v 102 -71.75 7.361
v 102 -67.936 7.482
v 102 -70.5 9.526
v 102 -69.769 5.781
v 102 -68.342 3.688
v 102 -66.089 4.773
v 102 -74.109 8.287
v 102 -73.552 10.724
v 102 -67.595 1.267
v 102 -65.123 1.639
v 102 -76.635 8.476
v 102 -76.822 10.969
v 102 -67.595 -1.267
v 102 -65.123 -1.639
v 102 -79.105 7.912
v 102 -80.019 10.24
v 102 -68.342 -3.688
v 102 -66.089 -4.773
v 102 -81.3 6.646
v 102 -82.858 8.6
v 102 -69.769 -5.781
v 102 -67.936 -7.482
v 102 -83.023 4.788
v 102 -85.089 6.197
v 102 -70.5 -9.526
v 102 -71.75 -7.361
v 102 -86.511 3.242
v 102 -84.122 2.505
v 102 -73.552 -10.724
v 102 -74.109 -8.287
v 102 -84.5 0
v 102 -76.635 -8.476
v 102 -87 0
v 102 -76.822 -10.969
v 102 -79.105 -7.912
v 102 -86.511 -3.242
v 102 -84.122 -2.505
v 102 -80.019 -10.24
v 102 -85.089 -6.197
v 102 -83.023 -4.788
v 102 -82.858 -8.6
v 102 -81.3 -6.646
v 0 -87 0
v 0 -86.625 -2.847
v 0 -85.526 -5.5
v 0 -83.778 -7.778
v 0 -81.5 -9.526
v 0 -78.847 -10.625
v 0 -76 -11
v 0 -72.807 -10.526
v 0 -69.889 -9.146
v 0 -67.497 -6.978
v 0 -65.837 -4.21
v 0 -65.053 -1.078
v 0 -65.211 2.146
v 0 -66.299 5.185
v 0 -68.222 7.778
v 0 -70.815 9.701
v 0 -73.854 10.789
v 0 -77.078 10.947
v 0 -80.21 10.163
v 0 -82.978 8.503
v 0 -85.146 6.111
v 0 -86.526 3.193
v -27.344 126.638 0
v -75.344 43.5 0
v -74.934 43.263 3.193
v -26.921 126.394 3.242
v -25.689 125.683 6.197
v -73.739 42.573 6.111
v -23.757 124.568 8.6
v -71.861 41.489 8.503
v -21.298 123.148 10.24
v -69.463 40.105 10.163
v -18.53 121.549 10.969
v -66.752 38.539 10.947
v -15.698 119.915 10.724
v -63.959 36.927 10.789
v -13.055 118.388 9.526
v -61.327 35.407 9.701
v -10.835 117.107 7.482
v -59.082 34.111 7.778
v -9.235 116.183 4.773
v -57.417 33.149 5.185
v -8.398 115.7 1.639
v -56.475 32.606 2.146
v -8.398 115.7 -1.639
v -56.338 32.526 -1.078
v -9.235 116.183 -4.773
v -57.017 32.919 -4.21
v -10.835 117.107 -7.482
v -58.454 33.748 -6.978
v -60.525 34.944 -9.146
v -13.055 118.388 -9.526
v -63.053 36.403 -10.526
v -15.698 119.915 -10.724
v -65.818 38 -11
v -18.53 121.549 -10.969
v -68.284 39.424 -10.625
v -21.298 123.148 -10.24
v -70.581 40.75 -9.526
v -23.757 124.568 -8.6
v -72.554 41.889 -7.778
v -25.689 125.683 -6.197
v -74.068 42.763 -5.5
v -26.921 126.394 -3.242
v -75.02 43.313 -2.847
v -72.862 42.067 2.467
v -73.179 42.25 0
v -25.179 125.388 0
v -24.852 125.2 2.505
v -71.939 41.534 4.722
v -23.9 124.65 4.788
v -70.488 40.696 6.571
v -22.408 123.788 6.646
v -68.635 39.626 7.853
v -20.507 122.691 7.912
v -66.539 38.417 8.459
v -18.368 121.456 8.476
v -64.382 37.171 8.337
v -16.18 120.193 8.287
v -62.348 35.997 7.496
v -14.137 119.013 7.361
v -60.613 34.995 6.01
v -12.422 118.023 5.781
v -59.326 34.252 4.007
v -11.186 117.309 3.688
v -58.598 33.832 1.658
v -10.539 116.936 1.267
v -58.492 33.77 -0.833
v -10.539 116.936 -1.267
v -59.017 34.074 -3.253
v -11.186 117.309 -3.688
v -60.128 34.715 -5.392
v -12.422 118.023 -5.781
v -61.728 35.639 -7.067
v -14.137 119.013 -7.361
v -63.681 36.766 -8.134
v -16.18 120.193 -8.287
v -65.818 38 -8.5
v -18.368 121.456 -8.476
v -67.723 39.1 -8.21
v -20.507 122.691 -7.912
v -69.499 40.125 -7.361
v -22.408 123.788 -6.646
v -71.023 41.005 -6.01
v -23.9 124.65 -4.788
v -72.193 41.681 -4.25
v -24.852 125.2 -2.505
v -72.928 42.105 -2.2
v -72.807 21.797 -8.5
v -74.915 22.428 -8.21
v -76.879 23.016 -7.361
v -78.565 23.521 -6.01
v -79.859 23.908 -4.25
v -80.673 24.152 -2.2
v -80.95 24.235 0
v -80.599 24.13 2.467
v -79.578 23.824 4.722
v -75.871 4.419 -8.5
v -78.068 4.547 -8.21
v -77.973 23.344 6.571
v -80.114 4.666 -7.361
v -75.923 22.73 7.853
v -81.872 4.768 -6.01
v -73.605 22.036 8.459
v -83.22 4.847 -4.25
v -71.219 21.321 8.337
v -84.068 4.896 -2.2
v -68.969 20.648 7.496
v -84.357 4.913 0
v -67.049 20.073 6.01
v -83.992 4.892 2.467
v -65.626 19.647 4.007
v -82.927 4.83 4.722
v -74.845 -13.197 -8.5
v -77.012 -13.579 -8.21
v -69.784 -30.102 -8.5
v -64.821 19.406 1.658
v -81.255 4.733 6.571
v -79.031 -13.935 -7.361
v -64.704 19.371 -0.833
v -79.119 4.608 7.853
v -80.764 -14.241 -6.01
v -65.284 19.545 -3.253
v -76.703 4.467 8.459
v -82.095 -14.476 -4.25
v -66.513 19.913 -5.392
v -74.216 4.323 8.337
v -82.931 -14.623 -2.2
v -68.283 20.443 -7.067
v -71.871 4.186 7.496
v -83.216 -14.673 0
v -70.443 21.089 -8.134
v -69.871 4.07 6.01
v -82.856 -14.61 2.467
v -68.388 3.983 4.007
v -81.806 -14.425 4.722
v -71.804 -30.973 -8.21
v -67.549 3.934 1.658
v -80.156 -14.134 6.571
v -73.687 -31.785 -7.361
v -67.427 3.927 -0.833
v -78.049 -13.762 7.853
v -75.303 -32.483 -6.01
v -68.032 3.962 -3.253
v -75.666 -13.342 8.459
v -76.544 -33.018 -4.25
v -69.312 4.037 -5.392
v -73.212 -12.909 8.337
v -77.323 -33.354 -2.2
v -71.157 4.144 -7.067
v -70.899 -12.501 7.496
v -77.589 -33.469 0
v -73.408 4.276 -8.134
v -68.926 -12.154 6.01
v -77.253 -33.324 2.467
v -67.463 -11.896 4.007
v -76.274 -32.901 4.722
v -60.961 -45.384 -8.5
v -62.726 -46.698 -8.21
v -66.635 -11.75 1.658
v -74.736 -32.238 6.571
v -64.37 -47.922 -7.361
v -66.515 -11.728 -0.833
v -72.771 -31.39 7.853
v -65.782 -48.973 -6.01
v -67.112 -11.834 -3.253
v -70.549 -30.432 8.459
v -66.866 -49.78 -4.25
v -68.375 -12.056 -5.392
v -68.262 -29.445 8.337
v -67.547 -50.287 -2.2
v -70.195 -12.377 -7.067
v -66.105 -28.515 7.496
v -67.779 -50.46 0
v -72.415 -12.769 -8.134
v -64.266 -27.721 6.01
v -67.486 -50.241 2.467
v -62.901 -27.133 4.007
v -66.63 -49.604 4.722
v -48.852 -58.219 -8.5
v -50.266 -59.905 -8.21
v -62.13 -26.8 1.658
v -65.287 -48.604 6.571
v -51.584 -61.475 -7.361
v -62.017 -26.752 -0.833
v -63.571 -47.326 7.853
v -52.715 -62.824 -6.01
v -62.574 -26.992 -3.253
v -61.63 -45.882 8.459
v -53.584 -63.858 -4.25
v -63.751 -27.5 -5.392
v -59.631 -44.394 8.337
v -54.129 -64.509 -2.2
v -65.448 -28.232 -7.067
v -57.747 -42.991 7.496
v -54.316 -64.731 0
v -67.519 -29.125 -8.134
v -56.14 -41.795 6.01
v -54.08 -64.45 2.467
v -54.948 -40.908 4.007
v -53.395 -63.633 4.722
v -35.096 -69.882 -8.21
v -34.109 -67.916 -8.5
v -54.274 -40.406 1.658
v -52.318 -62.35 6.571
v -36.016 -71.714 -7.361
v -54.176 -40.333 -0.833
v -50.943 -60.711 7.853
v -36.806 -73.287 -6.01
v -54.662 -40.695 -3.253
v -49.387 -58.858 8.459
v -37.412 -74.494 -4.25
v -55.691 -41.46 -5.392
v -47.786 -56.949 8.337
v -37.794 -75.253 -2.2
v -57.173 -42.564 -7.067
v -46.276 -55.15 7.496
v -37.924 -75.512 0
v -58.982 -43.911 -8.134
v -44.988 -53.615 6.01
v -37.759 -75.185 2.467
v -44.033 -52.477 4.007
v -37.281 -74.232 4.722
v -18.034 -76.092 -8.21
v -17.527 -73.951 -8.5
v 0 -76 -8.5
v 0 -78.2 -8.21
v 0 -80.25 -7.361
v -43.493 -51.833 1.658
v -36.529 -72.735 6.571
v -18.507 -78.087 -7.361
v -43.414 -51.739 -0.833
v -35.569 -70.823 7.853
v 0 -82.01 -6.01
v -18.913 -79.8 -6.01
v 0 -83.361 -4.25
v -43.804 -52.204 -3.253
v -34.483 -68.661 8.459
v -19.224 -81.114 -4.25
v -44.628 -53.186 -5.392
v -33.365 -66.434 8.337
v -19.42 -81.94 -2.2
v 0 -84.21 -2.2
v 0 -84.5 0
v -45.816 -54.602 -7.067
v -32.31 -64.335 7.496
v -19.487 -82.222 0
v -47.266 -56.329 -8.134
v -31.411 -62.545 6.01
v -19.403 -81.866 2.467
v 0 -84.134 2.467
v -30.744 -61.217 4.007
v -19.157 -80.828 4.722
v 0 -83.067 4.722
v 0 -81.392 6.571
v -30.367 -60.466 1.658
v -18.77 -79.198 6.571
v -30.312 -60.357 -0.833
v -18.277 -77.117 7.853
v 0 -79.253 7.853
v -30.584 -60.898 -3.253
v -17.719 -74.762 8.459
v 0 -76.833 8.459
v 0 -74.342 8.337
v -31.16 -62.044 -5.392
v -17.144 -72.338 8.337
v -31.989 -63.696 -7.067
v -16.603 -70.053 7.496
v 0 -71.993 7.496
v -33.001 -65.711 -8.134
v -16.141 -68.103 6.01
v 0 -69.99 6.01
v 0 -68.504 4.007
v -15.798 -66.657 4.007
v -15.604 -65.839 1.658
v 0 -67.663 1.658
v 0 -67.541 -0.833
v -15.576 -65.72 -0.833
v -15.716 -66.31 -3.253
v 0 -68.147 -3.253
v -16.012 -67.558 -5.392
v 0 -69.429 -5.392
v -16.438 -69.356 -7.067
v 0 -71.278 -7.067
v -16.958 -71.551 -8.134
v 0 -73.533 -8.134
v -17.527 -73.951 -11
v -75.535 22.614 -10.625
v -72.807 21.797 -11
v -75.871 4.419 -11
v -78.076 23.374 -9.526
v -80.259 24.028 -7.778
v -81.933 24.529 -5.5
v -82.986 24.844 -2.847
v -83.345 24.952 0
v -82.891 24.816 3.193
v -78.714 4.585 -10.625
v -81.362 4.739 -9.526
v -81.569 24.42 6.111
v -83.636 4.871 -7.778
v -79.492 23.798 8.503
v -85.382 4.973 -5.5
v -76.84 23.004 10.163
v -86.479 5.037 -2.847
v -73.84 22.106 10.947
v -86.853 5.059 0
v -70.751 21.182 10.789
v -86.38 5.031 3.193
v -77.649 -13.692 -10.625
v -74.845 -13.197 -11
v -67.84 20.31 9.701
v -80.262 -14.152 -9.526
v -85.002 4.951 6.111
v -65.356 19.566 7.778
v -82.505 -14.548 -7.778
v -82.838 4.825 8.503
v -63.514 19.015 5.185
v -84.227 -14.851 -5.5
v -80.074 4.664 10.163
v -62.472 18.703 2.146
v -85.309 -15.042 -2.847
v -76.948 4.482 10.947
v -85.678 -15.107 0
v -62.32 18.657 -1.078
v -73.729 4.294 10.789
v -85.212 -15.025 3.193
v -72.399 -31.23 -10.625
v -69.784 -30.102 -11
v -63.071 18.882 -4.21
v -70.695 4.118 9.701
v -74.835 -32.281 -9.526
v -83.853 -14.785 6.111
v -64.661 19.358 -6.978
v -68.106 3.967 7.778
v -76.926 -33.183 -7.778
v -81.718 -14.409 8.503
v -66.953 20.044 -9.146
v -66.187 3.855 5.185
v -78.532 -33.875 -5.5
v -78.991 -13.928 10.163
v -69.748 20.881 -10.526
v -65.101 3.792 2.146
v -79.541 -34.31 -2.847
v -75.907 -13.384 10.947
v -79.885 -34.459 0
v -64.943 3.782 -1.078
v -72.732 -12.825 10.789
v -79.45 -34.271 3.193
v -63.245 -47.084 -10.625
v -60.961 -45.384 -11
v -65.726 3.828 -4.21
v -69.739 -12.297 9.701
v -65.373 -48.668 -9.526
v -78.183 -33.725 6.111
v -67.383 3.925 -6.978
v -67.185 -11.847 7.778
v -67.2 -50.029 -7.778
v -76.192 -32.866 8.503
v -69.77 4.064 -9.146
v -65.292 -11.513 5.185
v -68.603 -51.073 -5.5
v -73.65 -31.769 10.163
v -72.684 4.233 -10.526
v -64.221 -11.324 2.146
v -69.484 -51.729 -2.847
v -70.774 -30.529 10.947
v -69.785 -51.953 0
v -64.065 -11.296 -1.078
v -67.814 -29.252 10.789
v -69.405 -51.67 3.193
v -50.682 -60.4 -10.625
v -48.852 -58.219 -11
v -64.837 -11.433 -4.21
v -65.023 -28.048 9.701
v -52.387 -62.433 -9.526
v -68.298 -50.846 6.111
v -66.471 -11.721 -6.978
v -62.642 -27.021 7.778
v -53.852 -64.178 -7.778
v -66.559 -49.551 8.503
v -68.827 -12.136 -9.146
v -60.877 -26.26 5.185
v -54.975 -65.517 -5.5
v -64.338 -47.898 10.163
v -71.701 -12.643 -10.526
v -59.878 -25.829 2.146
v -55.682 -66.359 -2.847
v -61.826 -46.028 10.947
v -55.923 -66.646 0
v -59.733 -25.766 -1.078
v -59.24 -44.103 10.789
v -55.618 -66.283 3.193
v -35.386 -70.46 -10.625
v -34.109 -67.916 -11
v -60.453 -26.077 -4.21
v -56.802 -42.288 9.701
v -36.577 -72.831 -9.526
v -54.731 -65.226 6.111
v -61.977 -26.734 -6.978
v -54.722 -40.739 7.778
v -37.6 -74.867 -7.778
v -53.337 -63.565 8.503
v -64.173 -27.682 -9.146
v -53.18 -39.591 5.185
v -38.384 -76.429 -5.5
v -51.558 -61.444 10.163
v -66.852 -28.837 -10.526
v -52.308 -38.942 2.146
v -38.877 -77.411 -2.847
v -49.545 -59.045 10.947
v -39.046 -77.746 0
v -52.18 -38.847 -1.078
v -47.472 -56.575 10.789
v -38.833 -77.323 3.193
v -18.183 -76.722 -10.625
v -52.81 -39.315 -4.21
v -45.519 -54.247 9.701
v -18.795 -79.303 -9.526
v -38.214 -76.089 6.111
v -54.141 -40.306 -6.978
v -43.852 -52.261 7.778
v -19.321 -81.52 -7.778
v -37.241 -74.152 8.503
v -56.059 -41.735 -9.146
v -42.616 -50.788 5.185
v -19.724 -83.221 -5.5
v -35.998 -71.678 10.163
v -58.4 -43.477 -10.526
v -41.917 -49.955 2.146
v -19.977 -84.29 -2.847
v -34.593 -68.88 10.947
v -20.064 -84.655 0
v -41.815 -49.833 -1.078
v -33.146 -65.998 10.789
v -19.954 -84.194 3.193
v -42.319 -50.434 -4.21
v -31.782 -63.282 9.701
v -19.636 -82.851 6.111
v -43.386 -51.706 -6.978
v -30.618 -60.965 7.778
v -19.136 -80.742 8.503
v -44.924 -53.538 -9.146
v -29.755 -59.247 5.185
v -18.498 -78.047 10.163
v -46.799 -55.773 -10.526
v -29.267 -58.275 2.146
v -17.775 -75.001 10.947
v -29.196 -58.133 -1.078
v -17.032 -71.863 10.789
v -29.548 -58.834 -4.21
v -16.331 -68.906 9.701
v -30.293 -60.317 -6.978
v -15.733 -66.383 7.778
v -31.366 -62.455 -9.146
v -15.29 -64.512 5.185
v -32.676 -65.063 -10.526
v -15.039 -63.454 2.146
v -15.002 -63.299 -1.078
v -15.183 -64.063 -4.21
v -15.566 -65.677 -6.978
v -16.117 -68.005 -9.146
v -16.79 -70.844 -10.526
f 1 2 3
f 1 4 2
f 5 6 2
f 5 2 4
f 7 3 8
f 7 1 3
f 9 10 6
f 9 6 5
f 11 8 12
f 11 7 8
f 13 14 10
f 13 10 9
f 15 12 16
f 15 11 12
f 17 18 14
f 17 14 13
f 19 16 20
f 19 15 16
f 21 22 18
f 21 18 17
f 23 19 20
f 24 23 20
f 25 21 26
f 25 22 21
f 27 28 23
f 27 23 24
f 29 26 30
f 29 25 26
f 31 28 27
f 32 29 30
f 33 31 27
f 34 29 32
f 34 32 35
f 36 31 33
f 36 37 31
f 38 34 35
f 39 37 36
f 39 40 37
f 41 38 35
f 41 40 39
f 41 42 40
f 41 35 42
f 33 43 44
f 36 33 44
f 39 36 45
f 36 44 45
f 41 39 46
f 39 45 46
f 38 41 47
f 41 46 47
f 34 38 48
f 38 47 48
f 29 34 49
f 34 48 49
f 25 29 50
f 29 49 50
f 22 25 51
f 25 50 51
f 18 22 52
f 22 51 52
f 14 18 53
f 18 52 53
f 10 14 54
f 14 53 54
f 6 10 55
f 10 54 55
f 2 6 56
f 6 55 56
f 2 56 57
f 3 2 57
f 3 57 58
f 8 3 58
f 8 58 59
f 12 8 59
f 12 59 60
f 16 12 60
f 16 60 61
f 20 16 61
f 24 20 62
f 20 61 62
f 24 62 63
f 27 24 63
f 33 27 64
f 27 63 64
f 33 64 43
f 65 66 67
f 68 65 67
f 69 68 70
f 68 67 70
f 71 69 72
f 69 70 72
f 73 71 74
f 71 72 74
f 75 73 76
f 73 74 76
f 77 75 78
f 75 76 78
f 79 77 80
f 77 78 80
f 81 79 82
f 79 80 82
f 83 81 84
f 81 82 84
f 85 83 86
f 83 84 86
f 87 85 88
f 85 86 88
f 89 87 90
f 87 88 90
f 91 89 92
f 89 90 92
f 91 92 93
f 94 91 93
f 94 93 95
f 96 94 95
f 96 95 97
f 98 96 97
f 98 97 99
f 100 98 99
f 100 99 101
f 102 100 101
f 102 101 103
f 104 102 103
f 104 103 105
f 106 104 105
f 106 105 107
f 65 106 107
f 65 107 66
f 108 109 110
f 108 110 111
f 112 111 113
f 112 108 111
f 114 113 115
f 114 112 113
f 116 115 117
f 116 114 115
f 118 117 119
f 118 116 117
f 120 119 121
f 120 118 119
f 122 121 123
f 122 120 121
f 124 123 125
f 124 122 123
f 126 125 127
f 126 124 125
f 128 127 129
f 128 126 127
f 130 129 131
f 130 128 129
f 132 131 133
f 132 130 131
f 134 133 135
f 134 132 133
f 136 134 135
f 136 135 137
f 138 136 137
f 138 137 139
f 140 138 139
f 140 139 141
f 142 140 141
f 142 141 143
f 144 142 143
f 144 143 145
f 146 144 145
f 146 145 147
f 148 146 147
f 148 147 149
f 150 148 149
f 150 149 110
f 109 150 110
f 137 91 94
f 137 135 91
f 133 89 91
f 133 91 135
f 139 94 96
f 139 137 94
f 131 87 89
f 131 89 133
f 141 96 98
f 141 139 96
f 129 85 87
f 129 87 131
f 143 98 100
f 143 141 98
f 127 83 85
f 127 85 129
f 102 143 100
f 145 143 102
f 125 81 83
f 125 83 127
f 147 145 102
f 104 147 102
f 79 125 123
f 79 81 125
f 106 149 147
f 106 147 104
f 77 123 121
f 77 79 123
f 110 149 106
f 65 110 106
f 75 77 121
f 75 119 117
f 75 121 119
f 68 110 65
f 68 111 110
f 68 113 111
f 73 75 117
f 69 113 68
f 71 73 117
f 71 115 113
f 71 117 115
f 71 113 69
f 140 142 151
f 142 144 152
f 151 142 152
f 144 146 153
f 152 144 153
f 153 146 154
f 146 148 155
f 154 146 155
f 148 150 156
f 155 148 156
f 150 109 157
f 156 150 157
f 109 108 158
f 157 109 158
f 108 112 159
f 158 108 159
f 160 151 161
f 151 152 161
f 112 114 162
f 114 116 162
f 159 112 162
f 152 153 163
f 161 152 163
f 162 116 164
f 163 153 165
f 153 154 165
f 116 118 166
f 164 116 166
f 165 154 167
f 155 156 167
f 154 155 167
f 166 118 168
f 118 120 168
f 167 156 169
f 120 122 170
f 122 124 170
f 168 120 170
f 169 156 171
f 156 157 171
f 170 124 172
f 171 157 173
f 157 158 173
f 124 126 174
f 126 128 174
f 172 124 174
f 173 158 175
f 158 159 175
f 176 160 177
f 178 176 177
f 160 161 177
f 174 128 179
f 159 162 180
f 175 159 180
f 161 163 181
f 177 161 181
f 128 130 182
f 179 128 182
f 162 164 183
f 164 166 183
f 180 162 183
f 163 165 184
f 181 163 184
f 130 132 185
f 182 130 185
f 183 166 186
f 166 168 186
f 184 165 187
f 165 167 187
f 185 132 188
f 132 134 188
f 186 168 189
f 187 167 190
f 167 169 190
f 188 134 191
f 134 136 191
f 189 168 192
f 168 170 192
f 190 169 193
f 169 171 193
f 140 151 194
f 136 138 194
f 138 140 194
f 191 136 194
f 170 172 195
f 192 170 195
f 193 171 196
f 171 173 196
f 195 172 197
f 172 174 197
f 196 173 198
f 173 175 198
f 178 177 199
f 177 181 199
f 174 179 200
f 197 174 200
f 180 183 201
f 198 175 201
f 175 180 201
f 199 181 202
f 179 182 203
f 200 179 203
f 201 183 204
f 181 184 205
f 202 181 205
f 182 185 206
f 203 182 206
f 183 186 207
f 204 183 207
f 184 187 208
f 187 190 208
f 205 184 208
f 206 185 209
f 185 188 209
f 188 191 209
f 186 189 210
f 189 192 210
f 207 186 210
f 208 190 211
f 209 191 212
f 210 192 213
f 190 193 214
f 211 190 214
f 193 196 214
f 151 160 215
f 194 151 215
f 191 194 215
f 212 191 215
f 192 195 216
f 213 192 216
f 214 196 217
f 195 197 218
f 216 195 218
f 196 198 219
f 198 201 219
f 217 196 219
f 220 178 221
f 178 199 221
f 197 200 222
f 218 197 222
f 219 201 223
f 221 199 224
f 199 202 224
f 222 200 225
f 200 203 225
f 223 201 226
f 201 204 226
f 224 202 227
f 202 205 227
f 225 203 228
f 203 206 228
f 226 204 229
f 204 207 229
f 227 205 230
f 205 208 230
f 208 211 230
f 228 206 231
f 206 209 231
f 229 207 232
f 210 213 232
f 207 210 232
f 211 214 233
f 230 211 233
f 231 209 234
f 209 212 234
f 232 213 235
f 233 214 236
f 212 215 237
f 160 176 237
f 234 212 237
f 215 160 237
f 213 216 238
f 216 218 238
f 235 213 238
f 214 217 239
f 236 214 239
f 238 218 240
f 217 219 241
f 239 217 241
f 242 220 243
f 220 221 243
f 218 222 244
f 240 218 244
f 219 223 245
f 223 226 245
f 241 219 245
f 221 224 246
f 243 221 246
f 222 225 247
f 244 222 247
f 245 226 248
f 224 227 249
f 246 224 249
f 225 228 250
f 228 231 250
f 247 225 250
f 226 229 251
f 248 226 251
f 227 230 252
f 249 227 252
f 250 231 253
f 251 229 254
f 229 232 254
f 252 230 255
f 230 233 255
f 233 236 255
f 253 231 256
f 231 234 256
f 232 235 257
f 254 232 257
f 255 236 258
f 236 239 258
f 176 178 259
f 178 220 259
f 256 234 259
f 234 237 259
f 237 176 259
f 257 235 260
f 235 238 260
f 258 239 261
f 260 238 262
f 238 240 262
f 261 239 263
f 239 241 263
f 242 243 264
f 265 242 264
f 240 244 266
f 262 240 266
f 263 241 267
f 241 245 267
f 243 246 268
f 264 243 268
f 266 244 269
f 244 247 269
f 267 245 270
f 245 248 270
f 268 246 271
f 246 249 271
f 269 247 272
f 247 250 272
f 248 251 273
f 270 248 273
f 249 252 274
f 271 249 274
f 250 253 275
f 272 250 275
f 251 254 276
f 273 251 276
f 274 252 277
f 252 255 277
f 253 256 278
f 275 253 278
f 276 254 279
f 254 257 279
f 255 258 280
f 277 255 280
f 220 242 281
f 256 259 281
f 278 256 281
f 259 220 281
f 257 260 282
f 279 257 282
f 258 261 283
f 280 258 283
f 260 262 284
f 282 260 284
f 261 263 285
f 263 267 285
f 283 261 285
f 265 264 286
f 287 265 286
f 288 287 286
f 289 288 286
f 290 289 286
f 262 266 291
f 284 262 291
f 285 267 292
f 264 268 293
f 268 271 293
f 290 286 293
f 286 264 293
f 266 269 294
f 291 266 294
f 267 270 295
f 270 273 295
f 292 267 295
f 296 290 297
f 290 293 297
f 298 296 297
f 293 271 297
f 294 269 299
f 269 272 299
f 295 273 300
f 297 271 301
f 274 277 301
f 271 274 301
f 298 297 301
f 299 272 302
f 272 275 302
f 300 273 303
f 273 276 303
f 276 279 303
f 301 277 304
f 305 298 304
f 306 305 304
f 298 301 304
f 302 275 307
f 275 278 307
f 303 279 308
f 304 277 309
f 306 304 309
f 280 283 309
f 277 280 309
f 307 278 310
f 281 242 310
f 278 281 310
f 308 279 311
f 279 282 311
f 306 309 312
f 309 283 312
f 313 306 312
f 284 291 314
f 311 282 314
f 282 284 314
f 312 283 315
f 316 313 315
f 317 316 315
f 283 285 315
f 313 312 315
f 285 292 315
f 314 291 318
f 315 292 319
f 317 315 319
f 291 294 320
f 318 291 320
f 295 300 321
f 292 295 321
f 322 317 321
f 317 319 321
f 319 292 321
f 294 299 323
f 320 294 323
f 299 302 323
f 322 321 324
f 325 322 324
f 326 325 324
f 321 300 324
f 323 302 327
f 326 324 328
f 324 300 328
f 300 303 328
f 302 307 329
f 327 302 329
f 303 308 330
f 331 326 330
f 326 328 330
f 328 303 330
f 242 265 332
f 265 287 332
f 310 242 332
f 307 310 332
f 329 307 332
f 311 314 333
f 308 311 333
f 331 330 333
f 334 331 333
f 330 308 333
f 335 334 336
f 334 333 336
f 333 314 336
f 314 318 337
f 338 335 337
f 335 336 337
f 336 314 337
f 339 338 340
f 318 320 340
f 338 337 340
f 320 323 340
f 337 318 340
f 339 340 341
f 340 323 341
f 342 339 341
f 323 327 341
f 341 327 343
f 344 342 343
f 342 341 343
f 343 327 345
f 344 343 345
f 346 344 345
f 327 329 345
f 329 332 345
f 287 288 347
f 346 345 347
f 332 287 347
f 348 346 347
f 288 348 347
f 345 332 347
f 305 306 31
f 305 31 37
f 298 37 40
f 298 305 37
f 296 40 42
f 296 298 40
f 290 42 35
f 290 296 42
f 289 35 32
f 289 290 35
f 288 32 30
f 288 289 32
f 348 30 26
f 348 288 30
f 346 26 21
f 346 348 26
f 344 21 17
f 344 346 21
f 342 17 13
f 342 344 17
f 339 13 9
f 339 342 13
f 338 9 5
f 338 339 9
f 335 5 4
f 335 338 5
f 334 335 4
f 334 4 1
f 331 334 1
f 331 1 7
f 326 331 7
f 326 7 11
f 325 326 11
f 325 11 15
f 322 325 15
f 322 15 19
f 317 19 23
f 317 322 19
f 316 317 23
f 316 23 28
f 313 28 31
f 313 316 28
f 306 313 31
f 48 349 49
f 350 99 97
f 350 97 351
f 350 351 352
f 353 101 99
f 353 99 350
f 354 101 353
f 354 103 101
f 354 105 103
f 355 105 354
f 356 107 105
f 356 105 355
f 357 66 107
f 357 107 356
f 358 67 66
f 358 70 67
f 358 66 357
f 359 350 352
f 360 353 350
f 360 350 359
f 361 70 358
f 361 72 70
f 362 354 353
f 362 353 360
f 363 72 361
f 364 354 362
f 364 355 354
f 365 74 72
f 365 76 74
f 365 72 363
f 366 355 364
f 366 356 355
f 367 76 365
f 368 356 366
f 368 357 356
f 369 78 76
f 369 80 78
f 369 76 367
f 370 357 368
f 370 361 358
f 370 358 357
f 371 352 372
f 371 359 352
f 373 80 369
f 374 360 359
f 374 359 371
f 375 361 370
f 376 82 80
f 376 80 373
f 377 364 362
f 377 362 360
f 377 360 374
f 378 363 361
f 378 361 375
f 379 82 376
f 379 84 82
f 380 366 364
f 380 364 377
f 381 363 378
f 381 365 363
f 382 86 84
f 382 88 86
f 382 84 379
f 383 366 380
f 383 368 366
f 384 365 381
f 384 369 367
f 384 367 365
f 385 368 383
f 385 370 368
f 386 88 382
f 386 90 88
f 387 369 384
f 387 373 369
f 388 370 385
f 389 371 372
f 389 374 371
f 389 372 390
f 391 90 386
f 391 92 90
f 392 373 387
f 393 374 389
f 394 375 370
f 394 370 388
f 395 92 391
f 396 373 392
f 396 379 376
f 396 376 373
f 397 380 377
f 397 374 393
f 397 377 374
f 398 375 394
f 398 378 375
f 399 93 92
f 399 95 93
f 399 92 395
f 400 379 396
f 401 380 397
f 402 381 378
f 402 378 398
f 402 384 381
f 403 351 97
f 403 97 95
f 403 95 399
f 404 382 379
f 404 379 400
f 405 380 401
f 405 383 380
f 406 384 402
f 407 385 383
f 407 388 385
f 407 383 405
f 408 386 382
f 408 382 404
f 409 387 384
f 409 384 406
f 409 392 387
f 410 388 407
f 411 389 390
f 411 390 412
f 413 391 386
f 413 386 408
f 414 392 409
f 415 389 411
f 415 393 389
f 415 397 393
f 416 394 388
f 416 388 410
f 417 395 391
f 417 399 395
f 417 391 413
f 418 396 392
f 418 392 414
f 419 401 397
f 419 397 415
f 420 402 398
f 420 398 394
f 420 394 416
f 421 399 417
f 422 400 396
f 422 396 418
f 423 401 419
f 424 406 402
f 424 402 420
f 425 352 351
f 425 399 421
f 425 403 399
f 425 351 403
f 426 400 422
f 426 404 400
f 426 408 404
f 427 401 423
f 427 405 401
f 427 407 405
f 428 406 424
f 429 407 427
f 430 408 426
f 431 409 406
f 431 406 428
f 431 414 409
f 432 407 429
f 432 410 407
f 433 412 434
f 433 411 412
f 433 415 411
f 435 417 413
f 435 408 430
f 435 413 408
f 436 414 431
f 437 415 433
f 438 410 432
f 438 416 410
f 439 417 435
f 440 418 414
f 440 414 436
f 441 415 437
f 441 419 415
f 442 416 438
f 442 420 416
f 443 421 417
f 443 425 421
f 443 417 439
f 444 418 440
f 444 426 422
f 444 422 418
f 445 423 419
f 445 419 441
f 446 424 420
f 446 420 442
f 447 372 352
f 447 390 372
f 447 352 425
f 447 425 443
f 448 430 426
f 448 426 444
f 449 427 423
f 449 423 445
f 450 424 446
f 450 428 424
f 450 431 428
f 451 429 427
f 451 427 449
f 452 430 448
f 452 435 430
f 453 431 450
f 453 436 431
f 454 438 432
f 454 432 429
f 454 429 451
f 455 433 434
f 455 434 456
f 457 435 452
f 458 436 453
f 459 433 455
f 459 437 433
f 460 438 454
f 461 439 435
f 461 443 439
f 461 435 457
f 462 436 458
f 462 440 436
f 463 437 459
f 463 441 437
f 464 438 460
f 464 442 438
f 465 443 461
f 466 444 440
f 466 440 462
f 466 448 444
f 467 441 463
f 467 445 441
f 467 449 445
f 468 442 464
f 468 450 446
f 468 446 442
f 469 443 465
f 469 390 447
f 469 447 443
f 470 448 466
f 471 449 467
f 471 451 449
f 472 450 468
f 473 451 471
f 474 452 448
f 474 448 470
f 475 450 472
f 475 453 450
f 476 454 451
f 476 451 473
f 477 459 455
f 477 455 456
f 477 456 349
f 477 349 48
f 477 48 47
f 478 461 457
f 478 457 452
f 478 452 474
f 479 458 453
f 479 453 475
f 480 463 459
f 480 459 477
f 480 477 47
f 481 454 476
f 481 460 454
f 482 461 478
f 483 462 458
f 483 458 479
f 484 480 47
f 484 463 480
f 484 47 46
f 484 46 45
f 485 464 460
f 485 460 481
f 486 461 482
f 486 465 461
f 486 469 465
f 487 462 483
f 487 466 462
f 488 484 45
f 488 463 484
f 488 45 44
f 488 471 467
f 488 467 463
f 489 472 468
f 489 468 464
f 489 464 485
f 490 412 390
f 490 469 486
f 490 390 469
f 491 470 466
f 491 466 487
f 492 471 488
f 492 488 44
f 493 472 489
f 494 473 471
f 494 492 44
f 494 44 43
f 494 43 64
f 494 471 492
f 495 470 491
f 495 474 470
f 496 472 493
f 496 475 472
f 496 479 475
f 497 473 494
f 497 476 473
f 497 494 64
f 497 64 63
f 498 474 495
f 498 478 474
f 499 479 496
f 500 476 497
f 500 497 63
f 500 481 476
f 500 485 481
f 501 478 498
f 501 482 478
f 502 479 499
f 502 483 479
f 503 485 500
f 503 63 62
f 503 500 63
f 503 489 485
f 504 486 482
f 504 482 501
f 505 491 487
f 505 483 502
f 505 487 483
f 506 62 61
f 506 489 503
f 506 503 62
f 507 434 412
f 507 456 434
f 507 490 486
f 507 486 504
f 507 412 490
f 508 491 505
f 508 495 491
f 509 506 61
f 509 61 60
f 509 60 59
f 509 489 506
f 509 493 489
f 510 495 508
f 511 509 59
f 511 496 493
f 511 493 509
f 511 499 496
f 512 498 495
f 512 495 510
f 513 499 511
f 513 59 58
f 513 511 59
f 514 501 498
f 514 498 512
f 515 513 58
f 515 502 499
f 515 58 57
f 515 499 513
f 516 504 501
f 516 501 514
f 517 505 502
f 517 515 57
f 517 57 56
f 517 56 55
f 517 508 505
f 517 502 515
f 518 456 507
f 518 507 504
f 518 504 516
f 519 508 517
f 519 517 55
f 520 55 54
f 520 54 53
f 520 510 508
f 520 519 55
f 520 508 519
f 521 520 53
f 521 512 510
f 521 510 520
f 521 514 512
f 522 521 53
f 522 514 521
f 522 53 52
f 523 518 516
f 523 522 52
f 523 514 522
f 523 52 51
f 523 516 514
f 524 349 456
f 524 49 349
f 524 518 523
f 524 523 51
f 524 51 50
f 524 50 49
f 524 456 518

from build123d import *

# Parameters (mm, degrees)
ESQUISSE2_R        = 11
ESQUISSE2_R_2      = 8.5
ESQUISSE3_R        = 11
ESQUISSE3_R_2      = 8.5
BOSS_EXTRU_1_DEPTH = 102
ESQUISSE4_R        = 11
ESQUISSE4_R_2      = 8.5
BOSS_EXTRU_2_DEPTH = 96


with BuildPart() as part:
    # Base-Balayage: sweep along a path in Esquisse1
    with BuildLine(Plane.XY) as base_balayage_path:
        ThreePointArc((-65.817930688, 38), (-65.817930688, -38), (0, -76))
    # Esquisse2 → Base-Balayage (sweep)
    with BuildSketch(Plane(origin=(0, 0, 0), x_dir=(0, 0, -1), z_dir=(1, 0, 0))):
        with Locations((0, -76)):
            Circle(ESQUISSE2_R)
        with Locations((0, -76)):
            Circle(ESQUISSE2_R_2, mode=Mode.SUBTRACT)
    sweep(path=base_balayage_path.line)

    # Esquisse3 → Boss.-Extru.1 (add)
    with BuildSketch(Plane(origin=(0, 0, 0), x_dir=(0, 0, -1), z_dir=(1, 0, 0))):
        with Locations(Location((0, -76, 0), (0, 0, 270))):
            Circle(ESQUISSE3_R)
        with Locations(Location((0, -76, 0), (0, 0, 270))):
            Circle(ESQUISSE3_R_2, mode=Mode.SUBTRACT)
    extrude(amount=BOSS_EXTRU_1_DEPTH)

    # Esquisse4 → Boss.-Extru.2 (add)
    with BuildSketch(Plane(origin=(0, 0, 0), x_dir=(-0.8660254037844417, 0.4999999999999947, 0), z_dir=(0.49999999999999484, 0.8660254037844418, 0))):
        with Locations((76, 0)):
            Circle(ESQUISSE4_R)
        with Locations((76, 0)):
            Circle(ESQUISSE4_R_2, mode=Mode.SUBTRACT)
    extrude(amount=BOSS_EXTRU_2_DEPTH)


solid = part.part
